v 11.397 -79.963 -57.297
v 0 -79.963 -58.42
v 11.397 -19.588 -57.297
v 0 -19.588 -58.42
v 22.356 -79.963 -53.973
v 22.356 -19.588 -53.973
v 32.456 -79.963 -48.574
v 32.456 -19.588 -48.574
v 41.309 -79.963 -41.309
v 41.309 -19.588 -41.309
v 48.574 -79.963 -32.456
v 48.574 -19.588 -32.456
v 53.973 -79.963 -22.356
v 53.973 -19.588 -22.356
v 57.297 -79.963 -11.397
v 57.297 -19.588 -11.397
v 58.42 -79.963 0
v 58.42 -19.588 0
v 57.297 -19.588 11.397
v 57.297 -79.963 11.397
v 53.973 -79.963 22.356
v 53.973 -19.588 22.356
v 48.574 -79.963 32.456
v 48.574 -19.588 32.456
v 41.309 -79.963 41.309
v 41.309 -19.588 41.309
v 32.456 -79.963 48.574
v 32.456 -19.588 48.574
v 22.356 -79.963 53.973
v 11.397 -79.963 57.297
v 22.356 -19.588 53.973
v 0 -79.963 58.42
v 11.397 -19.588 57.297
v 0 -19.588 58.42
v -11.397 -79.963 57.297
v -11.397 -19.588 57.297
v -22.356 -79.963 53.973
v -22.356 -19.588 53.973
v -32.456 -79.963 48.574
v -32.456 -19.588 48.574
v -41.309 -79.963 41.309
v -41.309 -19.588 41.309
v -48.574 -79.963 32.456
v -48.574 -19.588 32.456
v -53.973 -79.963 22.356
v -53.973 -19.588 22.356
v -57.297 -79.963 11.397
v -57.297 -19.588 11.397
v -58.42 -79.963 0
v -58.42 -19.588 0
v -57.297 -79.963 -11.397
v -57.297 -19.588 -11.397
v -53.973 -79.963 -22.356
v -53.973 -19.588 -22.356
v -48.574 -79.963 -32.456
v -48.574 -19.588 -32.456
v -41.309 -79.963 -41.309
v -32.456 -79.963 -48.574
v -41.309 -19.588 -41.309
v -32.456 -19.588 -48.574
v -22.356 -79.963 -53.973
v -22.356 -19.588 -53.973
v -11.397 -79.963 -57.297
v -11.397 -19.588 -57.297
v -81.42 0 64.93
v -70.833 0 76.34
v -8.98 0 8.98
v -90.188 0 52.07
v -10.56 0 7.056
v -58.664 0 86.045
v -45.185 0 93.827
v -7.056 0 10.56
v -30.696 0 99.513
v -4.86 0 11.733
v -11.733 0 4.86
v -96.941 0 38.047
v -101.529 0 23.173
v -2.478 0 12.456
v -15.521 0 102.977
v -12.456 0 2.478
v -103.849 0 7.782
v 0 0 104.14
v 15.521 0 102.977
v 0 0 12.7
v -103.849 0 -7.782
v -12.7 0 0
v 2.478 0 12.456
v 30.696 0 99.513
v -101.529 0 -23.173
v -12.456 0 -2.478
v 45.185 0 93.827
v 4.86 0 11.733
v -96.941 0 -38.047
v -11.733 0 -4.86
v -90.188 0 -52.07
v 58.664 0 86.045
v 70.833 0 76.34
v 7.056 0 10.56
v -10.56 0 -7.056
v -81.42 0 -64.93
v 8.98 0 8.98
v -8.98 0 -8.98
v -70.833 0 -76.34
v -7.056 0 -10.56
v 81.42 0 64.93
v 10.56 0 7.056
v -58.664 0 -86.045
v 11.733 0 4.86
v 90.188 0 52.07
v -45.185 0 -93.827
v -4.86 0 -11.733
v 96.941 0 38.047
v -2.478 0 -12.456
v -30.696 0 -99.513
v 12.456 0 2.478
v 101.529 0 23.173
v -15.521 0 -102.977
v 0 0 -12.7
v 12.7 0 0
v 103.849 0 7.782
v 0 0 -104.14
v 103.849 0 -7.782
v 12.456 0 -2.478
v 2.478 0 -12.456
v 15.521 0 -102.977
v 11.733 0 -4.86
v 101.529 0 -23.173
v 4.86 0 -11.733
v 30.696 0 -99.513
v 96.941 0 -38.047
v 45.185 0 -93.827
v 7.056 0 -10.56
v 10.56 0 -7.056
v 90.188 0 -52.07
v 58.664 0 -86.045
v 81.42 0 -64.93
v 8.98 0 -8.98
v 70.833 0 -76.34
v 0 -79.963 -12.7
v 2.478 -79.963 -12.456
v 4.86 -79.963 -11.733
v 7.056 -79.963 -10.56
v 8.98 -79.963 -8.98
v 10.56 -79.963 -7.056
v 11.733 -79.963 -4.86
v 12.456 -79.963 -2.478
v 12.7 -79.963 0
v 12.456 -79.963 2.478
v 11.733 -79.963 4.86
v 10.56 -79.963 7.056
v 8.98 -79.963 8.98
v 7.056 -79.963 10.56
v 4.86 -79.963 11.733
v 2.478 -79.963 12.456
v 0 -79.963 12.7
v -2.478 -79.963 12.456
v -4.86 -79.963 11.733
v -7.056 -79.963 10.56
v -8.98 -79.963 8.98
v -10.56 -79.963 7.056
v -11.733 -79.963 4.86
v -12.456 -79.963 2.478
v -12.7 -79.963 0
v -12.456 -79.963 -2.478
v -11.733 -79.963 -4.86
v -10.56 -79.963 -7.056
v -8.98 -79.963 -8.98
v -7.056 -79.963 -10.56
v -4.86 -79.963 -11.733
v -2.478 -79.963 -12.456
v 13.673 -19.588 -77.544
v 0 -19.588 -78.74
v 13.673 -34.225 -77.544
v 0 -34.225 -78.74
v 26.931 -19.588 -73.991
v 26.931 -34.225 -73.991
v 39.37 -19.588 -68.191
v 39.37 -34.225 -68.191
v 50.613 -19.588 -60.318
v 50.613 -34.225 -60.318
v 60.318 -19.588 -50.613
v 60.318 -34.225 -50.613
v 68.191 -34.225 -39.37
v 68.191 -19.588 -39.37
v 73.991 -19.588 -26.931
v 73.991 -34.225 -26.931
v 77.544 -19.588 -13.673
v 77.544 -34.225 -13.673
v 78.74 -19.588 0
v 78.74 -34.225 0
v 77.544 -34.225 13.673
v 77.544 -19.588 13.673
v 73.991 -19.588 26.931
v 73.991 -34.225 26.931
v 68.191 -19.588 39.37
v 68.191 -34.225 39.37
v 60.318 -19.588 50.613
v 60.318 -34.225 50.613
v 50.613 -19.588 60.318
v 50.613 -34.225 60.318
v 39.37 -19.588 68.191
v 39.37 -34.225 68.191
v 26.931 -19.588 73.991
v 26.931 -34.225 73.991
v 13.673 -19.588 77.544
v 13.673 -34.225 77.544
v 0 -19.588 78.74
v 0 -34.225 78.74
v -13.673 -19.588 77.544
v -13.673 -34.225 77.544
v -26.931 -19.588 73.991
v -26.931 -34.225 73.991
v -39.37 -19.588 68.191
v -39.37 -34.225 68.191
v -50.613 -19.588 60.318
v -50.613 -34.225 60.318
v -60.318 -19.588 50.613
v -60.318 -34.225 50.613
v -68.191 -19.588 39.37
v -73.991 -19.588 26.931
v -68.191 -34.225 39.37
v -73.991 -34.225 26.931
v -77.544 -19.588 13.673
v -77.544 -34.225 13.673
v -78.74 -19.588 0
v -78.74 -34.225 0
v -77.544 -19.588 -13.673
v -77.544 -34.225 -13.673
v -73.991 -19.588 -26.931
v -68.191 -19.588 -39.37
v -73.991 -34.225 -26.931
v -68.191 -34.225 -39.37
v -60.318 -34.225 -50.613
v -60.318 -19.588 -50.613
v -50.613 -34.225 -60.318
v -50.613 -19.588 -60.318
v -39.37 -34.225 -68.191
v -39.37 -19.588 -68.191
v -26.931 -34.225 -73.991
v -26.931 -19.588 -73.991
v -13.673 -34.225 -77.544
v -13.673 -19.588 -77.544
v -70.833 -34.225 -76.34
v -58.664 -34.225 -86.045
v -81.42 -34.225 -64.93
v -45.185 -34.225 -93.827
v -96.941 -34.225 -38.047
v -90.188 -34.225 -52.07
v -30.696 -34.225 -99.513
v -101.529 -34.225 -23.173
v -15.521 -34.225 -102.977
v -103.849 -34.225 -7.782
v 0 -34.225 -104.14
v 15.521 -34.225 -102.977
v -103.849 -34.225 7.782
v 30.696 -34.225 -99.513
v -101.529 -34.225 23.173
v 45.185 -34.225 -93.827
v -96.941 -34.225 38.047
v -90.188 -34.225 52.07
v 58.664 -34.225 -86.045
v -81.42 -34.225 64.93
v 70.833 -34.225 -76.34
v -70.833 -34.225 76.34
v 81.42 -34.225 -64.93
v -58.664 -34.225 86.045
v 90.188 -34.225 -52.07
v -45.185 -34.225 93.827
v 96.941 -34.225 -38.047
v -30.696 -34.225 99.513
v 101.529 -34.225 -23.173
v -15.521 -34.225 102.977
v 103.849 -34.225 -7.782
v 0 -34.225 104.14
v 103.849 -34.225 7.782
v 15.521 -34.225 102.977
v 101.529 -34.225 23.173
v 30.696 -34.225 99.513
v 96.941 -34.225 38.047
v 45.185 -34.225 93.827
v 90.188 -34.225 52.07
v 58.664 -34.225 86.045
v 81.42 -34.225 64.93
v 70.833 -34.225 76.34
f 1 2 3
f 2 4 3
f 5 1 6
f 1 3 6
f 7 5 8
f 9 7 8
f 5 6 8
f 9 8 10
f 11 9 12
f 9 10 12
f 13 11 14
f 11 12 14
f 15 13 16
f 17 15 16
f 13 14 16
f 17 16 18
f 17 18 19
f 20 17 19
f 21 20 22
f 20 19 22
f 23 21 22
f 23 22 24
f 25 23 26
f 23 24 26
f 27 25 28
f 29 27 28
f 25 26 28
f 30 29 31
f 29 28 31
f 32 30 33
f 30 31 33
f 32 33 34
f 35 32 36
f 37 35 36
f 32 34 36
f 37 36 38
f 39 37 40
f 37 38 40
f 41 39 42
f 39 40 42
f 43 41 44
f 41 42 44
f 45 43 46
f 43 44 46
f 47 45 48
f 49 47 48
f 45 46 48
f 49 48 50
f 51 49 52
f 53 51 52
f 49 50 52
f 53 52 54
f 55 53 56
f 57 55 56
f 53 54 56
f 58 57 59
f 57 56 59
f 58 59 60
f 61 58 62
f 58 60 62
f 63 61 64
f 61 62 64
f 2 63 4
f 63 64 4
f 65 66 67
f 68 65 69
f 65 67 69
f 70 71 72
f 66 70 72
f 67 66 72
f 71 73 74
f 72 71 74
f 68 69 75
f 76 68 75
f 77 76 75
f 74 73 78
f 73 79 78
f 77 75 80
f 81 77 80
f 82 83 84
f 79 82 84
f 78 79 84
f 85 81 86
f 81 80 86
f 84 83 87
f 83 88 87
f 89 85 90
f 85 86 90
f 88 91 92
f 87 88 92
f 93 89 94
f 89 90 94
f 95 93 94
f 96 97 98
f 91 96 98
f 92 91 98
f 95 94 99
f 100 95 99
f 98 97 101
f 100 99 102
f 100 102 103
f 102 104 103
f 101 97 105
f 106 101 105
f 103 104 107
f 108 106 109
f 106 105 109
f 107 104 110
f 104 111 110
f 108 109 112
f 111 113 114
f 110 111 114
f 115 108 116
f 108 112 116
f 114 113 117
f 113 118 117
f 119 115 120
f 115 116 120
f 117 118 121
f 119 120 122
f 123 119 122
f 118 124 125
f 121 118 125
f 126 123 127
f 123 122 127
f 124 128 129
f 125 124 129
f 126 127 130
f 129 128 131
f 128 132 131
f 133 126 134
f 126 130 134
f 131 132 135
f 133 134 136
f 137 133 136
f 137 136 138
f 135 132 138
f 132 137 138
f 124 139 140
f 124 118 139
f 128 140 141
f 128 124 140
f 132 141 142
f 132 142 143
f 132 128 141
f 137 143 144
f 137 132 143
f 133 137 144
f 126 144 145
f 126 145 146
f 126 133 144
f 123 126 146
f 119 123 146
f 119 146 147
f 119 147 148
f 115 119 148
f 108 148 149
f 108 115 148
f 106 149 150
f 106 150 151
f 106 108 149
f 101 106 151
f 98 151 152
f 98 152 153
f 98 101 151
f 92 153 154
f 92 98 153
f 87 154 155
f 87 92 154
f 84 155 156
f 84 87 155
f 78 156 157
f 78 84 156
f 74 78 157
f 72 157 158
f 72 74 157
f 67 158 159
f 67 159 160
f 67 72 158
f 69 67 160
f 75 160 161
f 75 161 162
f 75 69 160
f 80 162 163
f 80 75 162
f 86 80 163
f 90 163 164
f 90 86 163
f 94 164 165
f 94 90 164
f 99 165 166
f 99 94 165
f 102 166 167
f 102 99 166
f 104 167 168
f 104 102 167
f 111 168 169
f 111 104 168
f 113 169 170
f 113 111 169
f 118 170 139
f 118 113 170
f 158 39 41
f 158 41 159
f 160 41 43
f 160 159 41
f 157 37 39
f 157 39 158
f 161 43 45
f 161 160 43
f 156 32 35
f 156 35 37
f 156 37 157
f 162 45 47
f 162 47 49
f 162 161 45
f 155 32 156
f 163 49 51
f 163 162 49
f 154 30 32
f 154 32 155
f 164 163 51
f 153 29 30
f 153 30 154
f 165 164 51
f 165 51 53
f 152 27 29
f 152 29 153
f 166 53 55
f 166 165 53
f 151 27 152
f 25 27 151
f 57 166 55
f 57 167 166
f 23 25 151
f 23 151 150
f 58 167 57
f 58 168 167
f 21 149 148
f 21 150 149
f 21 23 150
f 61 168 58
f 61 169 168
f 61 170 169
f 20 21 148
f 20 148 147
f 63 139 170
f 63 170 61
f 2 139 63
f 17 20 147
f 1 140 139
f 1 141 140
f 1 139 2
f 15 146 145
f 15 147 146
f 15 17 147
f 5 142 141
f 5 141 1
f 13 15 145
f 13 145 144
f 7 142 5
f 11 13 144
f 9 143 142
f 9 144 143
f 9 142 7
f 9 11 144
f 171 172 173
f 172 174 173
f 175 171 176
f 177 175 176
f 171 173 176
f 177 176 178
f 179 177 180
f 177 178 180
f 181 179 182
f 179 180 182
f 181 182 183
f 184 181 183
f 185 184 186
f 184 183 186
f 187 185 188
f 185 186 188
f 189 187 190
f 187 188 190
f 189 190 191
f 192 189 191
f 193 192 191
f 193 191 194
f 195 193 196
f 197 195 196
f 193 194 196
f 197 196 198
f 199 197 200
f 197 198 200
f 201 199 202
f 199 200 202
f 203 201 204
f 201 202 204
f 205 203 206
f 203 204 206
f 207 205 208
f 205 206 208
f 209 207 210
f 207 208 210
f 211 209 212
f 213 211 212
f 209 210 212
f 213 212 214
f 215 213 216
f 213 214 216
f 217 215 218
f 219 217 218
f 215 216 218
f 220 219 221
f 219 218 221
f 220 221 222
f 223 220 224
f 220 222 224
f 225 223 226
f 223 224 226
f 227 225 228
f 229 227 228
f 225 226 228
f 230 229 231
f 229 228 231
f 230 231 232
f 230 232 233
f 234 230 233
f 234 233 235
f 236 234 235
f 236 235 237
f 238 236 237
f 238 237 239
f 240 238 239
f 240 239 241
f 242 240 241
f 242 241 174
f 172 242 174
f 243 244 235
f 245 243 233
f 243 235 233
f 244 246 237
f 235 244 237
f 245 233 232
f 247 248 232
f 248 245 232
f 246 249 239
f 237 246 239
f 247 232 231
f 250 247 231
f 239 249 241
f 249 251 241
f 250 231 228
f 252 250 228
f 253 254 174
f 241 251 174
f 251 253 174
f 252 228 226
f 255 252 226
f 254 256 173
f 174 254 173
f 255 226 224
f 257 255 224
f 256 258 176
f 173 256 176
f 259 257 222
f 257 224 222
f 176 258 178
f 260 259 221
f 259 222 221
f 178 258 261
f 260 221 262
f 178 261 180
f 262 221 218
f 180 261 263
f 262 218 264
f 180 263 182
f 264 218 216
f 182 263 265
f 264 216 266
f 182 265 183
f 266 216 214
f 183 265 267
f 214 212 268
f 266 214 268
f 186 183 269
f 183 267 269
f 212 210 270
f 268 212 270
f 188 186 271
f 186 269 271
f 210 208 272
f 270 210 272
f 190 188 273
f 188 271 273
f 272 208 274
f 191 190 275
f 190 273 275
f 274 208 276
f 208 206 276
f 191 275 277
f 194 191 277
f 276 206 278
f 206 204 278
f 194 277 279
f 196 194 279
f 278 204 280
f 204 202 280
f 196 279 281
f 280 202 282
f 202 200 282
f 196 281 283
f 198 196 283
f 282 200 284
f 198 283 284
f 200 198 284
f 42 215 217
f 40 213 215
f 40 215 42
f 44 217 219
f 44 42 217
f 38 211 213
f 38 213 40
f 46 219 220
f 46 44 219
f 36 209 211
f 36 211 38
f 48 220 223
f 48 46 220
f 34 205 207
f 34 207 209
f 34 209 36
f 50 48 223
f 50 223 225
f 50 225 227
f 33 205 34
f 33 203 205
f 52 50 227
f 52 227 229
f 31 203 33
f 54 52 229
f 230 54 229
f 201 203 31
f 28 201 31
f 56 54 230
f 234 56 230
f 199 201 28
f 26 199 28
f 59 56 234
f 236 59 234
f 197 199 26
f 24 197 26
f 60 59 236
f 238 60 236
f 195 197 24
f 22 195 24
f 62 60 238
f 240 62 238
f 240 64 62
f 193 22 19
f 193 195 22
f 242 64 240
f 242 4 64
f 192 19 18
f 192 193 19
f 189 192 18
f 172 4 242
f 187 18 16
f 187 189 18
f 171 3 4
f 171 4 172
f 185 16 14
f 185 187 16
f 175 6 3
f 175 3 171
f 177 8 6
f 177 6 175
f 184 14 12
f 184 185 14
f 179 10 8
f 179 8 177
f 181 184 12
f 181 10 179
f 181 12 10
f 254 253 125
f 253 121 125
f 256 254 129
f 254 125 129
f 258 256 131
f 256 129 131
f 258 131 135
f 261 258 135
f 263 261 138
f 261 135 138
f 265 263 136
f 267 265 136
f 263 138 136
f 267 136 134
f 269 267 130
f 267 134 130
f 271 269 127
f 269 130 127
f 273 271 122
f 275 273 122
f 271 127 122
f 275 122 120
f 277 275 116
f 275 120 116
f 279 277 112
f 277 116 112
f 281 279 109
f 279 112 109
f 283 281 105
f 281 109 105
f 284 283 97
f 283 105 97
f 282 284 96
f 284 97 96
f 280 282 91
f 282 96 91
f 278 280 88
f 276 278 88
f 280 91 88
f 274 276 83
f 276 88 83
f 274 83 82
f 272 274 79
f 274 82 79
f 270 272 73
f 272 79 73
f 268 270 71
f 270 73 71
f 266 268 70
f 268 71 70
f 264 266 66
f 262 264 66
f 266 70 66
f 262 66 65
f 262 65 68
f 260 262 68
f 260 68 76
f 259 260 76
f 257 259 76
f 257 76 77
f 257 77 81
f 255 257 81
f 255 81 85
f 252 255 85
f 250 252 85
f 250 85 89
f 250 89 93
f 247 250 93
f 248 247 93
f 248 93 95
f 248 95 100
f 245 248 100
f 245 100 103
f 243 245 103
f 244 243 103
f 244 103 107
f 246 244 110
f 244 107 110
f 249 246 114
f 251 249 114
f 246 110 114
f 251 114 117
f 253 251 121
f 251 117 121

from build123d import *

# Parameters (mm, degrees)
F0_W     = 25.8305106723
F0_H     = 45.72
F0_W_2   = 19.5881370437
F0_H_2   = 20.32
F2_DEPTH = 34.544


with BuildPart() as f1:
    # F0 (on Right) → F1 (revolve)
    with BuildSketch(Plane.YZ):
        Polygon((0, -104.14), (0, -78.74), (-19.5881370437, -78.74), (-34.2254221025, -78.74), (-34.2254221025, -104.14), align=None)
        with Locations((-32.5033923798, -35.56)):
            Rectangle(F0_W, F0_H)
        with Locations((-9.7940685218, -68.58)):
            Rectangle(F0_W_2, F0_H_2)
        with Locations((-9.7940685218, -35.56)):
            Rectangle(F0_W_2, F0_H)
    revolve(axis=Axis((0, -33.0415281269, 0), (0, -1, 0)))

    # F2 (add): a face of the model
    f2_faces = [f1.faces().sort_by_distance(p)[0] for p in [
        (0, -45.418647716, 14.3523671263),
    ]]
    extrude(f2_faces, amount=F2_DEPTH)


solid = f1.part
